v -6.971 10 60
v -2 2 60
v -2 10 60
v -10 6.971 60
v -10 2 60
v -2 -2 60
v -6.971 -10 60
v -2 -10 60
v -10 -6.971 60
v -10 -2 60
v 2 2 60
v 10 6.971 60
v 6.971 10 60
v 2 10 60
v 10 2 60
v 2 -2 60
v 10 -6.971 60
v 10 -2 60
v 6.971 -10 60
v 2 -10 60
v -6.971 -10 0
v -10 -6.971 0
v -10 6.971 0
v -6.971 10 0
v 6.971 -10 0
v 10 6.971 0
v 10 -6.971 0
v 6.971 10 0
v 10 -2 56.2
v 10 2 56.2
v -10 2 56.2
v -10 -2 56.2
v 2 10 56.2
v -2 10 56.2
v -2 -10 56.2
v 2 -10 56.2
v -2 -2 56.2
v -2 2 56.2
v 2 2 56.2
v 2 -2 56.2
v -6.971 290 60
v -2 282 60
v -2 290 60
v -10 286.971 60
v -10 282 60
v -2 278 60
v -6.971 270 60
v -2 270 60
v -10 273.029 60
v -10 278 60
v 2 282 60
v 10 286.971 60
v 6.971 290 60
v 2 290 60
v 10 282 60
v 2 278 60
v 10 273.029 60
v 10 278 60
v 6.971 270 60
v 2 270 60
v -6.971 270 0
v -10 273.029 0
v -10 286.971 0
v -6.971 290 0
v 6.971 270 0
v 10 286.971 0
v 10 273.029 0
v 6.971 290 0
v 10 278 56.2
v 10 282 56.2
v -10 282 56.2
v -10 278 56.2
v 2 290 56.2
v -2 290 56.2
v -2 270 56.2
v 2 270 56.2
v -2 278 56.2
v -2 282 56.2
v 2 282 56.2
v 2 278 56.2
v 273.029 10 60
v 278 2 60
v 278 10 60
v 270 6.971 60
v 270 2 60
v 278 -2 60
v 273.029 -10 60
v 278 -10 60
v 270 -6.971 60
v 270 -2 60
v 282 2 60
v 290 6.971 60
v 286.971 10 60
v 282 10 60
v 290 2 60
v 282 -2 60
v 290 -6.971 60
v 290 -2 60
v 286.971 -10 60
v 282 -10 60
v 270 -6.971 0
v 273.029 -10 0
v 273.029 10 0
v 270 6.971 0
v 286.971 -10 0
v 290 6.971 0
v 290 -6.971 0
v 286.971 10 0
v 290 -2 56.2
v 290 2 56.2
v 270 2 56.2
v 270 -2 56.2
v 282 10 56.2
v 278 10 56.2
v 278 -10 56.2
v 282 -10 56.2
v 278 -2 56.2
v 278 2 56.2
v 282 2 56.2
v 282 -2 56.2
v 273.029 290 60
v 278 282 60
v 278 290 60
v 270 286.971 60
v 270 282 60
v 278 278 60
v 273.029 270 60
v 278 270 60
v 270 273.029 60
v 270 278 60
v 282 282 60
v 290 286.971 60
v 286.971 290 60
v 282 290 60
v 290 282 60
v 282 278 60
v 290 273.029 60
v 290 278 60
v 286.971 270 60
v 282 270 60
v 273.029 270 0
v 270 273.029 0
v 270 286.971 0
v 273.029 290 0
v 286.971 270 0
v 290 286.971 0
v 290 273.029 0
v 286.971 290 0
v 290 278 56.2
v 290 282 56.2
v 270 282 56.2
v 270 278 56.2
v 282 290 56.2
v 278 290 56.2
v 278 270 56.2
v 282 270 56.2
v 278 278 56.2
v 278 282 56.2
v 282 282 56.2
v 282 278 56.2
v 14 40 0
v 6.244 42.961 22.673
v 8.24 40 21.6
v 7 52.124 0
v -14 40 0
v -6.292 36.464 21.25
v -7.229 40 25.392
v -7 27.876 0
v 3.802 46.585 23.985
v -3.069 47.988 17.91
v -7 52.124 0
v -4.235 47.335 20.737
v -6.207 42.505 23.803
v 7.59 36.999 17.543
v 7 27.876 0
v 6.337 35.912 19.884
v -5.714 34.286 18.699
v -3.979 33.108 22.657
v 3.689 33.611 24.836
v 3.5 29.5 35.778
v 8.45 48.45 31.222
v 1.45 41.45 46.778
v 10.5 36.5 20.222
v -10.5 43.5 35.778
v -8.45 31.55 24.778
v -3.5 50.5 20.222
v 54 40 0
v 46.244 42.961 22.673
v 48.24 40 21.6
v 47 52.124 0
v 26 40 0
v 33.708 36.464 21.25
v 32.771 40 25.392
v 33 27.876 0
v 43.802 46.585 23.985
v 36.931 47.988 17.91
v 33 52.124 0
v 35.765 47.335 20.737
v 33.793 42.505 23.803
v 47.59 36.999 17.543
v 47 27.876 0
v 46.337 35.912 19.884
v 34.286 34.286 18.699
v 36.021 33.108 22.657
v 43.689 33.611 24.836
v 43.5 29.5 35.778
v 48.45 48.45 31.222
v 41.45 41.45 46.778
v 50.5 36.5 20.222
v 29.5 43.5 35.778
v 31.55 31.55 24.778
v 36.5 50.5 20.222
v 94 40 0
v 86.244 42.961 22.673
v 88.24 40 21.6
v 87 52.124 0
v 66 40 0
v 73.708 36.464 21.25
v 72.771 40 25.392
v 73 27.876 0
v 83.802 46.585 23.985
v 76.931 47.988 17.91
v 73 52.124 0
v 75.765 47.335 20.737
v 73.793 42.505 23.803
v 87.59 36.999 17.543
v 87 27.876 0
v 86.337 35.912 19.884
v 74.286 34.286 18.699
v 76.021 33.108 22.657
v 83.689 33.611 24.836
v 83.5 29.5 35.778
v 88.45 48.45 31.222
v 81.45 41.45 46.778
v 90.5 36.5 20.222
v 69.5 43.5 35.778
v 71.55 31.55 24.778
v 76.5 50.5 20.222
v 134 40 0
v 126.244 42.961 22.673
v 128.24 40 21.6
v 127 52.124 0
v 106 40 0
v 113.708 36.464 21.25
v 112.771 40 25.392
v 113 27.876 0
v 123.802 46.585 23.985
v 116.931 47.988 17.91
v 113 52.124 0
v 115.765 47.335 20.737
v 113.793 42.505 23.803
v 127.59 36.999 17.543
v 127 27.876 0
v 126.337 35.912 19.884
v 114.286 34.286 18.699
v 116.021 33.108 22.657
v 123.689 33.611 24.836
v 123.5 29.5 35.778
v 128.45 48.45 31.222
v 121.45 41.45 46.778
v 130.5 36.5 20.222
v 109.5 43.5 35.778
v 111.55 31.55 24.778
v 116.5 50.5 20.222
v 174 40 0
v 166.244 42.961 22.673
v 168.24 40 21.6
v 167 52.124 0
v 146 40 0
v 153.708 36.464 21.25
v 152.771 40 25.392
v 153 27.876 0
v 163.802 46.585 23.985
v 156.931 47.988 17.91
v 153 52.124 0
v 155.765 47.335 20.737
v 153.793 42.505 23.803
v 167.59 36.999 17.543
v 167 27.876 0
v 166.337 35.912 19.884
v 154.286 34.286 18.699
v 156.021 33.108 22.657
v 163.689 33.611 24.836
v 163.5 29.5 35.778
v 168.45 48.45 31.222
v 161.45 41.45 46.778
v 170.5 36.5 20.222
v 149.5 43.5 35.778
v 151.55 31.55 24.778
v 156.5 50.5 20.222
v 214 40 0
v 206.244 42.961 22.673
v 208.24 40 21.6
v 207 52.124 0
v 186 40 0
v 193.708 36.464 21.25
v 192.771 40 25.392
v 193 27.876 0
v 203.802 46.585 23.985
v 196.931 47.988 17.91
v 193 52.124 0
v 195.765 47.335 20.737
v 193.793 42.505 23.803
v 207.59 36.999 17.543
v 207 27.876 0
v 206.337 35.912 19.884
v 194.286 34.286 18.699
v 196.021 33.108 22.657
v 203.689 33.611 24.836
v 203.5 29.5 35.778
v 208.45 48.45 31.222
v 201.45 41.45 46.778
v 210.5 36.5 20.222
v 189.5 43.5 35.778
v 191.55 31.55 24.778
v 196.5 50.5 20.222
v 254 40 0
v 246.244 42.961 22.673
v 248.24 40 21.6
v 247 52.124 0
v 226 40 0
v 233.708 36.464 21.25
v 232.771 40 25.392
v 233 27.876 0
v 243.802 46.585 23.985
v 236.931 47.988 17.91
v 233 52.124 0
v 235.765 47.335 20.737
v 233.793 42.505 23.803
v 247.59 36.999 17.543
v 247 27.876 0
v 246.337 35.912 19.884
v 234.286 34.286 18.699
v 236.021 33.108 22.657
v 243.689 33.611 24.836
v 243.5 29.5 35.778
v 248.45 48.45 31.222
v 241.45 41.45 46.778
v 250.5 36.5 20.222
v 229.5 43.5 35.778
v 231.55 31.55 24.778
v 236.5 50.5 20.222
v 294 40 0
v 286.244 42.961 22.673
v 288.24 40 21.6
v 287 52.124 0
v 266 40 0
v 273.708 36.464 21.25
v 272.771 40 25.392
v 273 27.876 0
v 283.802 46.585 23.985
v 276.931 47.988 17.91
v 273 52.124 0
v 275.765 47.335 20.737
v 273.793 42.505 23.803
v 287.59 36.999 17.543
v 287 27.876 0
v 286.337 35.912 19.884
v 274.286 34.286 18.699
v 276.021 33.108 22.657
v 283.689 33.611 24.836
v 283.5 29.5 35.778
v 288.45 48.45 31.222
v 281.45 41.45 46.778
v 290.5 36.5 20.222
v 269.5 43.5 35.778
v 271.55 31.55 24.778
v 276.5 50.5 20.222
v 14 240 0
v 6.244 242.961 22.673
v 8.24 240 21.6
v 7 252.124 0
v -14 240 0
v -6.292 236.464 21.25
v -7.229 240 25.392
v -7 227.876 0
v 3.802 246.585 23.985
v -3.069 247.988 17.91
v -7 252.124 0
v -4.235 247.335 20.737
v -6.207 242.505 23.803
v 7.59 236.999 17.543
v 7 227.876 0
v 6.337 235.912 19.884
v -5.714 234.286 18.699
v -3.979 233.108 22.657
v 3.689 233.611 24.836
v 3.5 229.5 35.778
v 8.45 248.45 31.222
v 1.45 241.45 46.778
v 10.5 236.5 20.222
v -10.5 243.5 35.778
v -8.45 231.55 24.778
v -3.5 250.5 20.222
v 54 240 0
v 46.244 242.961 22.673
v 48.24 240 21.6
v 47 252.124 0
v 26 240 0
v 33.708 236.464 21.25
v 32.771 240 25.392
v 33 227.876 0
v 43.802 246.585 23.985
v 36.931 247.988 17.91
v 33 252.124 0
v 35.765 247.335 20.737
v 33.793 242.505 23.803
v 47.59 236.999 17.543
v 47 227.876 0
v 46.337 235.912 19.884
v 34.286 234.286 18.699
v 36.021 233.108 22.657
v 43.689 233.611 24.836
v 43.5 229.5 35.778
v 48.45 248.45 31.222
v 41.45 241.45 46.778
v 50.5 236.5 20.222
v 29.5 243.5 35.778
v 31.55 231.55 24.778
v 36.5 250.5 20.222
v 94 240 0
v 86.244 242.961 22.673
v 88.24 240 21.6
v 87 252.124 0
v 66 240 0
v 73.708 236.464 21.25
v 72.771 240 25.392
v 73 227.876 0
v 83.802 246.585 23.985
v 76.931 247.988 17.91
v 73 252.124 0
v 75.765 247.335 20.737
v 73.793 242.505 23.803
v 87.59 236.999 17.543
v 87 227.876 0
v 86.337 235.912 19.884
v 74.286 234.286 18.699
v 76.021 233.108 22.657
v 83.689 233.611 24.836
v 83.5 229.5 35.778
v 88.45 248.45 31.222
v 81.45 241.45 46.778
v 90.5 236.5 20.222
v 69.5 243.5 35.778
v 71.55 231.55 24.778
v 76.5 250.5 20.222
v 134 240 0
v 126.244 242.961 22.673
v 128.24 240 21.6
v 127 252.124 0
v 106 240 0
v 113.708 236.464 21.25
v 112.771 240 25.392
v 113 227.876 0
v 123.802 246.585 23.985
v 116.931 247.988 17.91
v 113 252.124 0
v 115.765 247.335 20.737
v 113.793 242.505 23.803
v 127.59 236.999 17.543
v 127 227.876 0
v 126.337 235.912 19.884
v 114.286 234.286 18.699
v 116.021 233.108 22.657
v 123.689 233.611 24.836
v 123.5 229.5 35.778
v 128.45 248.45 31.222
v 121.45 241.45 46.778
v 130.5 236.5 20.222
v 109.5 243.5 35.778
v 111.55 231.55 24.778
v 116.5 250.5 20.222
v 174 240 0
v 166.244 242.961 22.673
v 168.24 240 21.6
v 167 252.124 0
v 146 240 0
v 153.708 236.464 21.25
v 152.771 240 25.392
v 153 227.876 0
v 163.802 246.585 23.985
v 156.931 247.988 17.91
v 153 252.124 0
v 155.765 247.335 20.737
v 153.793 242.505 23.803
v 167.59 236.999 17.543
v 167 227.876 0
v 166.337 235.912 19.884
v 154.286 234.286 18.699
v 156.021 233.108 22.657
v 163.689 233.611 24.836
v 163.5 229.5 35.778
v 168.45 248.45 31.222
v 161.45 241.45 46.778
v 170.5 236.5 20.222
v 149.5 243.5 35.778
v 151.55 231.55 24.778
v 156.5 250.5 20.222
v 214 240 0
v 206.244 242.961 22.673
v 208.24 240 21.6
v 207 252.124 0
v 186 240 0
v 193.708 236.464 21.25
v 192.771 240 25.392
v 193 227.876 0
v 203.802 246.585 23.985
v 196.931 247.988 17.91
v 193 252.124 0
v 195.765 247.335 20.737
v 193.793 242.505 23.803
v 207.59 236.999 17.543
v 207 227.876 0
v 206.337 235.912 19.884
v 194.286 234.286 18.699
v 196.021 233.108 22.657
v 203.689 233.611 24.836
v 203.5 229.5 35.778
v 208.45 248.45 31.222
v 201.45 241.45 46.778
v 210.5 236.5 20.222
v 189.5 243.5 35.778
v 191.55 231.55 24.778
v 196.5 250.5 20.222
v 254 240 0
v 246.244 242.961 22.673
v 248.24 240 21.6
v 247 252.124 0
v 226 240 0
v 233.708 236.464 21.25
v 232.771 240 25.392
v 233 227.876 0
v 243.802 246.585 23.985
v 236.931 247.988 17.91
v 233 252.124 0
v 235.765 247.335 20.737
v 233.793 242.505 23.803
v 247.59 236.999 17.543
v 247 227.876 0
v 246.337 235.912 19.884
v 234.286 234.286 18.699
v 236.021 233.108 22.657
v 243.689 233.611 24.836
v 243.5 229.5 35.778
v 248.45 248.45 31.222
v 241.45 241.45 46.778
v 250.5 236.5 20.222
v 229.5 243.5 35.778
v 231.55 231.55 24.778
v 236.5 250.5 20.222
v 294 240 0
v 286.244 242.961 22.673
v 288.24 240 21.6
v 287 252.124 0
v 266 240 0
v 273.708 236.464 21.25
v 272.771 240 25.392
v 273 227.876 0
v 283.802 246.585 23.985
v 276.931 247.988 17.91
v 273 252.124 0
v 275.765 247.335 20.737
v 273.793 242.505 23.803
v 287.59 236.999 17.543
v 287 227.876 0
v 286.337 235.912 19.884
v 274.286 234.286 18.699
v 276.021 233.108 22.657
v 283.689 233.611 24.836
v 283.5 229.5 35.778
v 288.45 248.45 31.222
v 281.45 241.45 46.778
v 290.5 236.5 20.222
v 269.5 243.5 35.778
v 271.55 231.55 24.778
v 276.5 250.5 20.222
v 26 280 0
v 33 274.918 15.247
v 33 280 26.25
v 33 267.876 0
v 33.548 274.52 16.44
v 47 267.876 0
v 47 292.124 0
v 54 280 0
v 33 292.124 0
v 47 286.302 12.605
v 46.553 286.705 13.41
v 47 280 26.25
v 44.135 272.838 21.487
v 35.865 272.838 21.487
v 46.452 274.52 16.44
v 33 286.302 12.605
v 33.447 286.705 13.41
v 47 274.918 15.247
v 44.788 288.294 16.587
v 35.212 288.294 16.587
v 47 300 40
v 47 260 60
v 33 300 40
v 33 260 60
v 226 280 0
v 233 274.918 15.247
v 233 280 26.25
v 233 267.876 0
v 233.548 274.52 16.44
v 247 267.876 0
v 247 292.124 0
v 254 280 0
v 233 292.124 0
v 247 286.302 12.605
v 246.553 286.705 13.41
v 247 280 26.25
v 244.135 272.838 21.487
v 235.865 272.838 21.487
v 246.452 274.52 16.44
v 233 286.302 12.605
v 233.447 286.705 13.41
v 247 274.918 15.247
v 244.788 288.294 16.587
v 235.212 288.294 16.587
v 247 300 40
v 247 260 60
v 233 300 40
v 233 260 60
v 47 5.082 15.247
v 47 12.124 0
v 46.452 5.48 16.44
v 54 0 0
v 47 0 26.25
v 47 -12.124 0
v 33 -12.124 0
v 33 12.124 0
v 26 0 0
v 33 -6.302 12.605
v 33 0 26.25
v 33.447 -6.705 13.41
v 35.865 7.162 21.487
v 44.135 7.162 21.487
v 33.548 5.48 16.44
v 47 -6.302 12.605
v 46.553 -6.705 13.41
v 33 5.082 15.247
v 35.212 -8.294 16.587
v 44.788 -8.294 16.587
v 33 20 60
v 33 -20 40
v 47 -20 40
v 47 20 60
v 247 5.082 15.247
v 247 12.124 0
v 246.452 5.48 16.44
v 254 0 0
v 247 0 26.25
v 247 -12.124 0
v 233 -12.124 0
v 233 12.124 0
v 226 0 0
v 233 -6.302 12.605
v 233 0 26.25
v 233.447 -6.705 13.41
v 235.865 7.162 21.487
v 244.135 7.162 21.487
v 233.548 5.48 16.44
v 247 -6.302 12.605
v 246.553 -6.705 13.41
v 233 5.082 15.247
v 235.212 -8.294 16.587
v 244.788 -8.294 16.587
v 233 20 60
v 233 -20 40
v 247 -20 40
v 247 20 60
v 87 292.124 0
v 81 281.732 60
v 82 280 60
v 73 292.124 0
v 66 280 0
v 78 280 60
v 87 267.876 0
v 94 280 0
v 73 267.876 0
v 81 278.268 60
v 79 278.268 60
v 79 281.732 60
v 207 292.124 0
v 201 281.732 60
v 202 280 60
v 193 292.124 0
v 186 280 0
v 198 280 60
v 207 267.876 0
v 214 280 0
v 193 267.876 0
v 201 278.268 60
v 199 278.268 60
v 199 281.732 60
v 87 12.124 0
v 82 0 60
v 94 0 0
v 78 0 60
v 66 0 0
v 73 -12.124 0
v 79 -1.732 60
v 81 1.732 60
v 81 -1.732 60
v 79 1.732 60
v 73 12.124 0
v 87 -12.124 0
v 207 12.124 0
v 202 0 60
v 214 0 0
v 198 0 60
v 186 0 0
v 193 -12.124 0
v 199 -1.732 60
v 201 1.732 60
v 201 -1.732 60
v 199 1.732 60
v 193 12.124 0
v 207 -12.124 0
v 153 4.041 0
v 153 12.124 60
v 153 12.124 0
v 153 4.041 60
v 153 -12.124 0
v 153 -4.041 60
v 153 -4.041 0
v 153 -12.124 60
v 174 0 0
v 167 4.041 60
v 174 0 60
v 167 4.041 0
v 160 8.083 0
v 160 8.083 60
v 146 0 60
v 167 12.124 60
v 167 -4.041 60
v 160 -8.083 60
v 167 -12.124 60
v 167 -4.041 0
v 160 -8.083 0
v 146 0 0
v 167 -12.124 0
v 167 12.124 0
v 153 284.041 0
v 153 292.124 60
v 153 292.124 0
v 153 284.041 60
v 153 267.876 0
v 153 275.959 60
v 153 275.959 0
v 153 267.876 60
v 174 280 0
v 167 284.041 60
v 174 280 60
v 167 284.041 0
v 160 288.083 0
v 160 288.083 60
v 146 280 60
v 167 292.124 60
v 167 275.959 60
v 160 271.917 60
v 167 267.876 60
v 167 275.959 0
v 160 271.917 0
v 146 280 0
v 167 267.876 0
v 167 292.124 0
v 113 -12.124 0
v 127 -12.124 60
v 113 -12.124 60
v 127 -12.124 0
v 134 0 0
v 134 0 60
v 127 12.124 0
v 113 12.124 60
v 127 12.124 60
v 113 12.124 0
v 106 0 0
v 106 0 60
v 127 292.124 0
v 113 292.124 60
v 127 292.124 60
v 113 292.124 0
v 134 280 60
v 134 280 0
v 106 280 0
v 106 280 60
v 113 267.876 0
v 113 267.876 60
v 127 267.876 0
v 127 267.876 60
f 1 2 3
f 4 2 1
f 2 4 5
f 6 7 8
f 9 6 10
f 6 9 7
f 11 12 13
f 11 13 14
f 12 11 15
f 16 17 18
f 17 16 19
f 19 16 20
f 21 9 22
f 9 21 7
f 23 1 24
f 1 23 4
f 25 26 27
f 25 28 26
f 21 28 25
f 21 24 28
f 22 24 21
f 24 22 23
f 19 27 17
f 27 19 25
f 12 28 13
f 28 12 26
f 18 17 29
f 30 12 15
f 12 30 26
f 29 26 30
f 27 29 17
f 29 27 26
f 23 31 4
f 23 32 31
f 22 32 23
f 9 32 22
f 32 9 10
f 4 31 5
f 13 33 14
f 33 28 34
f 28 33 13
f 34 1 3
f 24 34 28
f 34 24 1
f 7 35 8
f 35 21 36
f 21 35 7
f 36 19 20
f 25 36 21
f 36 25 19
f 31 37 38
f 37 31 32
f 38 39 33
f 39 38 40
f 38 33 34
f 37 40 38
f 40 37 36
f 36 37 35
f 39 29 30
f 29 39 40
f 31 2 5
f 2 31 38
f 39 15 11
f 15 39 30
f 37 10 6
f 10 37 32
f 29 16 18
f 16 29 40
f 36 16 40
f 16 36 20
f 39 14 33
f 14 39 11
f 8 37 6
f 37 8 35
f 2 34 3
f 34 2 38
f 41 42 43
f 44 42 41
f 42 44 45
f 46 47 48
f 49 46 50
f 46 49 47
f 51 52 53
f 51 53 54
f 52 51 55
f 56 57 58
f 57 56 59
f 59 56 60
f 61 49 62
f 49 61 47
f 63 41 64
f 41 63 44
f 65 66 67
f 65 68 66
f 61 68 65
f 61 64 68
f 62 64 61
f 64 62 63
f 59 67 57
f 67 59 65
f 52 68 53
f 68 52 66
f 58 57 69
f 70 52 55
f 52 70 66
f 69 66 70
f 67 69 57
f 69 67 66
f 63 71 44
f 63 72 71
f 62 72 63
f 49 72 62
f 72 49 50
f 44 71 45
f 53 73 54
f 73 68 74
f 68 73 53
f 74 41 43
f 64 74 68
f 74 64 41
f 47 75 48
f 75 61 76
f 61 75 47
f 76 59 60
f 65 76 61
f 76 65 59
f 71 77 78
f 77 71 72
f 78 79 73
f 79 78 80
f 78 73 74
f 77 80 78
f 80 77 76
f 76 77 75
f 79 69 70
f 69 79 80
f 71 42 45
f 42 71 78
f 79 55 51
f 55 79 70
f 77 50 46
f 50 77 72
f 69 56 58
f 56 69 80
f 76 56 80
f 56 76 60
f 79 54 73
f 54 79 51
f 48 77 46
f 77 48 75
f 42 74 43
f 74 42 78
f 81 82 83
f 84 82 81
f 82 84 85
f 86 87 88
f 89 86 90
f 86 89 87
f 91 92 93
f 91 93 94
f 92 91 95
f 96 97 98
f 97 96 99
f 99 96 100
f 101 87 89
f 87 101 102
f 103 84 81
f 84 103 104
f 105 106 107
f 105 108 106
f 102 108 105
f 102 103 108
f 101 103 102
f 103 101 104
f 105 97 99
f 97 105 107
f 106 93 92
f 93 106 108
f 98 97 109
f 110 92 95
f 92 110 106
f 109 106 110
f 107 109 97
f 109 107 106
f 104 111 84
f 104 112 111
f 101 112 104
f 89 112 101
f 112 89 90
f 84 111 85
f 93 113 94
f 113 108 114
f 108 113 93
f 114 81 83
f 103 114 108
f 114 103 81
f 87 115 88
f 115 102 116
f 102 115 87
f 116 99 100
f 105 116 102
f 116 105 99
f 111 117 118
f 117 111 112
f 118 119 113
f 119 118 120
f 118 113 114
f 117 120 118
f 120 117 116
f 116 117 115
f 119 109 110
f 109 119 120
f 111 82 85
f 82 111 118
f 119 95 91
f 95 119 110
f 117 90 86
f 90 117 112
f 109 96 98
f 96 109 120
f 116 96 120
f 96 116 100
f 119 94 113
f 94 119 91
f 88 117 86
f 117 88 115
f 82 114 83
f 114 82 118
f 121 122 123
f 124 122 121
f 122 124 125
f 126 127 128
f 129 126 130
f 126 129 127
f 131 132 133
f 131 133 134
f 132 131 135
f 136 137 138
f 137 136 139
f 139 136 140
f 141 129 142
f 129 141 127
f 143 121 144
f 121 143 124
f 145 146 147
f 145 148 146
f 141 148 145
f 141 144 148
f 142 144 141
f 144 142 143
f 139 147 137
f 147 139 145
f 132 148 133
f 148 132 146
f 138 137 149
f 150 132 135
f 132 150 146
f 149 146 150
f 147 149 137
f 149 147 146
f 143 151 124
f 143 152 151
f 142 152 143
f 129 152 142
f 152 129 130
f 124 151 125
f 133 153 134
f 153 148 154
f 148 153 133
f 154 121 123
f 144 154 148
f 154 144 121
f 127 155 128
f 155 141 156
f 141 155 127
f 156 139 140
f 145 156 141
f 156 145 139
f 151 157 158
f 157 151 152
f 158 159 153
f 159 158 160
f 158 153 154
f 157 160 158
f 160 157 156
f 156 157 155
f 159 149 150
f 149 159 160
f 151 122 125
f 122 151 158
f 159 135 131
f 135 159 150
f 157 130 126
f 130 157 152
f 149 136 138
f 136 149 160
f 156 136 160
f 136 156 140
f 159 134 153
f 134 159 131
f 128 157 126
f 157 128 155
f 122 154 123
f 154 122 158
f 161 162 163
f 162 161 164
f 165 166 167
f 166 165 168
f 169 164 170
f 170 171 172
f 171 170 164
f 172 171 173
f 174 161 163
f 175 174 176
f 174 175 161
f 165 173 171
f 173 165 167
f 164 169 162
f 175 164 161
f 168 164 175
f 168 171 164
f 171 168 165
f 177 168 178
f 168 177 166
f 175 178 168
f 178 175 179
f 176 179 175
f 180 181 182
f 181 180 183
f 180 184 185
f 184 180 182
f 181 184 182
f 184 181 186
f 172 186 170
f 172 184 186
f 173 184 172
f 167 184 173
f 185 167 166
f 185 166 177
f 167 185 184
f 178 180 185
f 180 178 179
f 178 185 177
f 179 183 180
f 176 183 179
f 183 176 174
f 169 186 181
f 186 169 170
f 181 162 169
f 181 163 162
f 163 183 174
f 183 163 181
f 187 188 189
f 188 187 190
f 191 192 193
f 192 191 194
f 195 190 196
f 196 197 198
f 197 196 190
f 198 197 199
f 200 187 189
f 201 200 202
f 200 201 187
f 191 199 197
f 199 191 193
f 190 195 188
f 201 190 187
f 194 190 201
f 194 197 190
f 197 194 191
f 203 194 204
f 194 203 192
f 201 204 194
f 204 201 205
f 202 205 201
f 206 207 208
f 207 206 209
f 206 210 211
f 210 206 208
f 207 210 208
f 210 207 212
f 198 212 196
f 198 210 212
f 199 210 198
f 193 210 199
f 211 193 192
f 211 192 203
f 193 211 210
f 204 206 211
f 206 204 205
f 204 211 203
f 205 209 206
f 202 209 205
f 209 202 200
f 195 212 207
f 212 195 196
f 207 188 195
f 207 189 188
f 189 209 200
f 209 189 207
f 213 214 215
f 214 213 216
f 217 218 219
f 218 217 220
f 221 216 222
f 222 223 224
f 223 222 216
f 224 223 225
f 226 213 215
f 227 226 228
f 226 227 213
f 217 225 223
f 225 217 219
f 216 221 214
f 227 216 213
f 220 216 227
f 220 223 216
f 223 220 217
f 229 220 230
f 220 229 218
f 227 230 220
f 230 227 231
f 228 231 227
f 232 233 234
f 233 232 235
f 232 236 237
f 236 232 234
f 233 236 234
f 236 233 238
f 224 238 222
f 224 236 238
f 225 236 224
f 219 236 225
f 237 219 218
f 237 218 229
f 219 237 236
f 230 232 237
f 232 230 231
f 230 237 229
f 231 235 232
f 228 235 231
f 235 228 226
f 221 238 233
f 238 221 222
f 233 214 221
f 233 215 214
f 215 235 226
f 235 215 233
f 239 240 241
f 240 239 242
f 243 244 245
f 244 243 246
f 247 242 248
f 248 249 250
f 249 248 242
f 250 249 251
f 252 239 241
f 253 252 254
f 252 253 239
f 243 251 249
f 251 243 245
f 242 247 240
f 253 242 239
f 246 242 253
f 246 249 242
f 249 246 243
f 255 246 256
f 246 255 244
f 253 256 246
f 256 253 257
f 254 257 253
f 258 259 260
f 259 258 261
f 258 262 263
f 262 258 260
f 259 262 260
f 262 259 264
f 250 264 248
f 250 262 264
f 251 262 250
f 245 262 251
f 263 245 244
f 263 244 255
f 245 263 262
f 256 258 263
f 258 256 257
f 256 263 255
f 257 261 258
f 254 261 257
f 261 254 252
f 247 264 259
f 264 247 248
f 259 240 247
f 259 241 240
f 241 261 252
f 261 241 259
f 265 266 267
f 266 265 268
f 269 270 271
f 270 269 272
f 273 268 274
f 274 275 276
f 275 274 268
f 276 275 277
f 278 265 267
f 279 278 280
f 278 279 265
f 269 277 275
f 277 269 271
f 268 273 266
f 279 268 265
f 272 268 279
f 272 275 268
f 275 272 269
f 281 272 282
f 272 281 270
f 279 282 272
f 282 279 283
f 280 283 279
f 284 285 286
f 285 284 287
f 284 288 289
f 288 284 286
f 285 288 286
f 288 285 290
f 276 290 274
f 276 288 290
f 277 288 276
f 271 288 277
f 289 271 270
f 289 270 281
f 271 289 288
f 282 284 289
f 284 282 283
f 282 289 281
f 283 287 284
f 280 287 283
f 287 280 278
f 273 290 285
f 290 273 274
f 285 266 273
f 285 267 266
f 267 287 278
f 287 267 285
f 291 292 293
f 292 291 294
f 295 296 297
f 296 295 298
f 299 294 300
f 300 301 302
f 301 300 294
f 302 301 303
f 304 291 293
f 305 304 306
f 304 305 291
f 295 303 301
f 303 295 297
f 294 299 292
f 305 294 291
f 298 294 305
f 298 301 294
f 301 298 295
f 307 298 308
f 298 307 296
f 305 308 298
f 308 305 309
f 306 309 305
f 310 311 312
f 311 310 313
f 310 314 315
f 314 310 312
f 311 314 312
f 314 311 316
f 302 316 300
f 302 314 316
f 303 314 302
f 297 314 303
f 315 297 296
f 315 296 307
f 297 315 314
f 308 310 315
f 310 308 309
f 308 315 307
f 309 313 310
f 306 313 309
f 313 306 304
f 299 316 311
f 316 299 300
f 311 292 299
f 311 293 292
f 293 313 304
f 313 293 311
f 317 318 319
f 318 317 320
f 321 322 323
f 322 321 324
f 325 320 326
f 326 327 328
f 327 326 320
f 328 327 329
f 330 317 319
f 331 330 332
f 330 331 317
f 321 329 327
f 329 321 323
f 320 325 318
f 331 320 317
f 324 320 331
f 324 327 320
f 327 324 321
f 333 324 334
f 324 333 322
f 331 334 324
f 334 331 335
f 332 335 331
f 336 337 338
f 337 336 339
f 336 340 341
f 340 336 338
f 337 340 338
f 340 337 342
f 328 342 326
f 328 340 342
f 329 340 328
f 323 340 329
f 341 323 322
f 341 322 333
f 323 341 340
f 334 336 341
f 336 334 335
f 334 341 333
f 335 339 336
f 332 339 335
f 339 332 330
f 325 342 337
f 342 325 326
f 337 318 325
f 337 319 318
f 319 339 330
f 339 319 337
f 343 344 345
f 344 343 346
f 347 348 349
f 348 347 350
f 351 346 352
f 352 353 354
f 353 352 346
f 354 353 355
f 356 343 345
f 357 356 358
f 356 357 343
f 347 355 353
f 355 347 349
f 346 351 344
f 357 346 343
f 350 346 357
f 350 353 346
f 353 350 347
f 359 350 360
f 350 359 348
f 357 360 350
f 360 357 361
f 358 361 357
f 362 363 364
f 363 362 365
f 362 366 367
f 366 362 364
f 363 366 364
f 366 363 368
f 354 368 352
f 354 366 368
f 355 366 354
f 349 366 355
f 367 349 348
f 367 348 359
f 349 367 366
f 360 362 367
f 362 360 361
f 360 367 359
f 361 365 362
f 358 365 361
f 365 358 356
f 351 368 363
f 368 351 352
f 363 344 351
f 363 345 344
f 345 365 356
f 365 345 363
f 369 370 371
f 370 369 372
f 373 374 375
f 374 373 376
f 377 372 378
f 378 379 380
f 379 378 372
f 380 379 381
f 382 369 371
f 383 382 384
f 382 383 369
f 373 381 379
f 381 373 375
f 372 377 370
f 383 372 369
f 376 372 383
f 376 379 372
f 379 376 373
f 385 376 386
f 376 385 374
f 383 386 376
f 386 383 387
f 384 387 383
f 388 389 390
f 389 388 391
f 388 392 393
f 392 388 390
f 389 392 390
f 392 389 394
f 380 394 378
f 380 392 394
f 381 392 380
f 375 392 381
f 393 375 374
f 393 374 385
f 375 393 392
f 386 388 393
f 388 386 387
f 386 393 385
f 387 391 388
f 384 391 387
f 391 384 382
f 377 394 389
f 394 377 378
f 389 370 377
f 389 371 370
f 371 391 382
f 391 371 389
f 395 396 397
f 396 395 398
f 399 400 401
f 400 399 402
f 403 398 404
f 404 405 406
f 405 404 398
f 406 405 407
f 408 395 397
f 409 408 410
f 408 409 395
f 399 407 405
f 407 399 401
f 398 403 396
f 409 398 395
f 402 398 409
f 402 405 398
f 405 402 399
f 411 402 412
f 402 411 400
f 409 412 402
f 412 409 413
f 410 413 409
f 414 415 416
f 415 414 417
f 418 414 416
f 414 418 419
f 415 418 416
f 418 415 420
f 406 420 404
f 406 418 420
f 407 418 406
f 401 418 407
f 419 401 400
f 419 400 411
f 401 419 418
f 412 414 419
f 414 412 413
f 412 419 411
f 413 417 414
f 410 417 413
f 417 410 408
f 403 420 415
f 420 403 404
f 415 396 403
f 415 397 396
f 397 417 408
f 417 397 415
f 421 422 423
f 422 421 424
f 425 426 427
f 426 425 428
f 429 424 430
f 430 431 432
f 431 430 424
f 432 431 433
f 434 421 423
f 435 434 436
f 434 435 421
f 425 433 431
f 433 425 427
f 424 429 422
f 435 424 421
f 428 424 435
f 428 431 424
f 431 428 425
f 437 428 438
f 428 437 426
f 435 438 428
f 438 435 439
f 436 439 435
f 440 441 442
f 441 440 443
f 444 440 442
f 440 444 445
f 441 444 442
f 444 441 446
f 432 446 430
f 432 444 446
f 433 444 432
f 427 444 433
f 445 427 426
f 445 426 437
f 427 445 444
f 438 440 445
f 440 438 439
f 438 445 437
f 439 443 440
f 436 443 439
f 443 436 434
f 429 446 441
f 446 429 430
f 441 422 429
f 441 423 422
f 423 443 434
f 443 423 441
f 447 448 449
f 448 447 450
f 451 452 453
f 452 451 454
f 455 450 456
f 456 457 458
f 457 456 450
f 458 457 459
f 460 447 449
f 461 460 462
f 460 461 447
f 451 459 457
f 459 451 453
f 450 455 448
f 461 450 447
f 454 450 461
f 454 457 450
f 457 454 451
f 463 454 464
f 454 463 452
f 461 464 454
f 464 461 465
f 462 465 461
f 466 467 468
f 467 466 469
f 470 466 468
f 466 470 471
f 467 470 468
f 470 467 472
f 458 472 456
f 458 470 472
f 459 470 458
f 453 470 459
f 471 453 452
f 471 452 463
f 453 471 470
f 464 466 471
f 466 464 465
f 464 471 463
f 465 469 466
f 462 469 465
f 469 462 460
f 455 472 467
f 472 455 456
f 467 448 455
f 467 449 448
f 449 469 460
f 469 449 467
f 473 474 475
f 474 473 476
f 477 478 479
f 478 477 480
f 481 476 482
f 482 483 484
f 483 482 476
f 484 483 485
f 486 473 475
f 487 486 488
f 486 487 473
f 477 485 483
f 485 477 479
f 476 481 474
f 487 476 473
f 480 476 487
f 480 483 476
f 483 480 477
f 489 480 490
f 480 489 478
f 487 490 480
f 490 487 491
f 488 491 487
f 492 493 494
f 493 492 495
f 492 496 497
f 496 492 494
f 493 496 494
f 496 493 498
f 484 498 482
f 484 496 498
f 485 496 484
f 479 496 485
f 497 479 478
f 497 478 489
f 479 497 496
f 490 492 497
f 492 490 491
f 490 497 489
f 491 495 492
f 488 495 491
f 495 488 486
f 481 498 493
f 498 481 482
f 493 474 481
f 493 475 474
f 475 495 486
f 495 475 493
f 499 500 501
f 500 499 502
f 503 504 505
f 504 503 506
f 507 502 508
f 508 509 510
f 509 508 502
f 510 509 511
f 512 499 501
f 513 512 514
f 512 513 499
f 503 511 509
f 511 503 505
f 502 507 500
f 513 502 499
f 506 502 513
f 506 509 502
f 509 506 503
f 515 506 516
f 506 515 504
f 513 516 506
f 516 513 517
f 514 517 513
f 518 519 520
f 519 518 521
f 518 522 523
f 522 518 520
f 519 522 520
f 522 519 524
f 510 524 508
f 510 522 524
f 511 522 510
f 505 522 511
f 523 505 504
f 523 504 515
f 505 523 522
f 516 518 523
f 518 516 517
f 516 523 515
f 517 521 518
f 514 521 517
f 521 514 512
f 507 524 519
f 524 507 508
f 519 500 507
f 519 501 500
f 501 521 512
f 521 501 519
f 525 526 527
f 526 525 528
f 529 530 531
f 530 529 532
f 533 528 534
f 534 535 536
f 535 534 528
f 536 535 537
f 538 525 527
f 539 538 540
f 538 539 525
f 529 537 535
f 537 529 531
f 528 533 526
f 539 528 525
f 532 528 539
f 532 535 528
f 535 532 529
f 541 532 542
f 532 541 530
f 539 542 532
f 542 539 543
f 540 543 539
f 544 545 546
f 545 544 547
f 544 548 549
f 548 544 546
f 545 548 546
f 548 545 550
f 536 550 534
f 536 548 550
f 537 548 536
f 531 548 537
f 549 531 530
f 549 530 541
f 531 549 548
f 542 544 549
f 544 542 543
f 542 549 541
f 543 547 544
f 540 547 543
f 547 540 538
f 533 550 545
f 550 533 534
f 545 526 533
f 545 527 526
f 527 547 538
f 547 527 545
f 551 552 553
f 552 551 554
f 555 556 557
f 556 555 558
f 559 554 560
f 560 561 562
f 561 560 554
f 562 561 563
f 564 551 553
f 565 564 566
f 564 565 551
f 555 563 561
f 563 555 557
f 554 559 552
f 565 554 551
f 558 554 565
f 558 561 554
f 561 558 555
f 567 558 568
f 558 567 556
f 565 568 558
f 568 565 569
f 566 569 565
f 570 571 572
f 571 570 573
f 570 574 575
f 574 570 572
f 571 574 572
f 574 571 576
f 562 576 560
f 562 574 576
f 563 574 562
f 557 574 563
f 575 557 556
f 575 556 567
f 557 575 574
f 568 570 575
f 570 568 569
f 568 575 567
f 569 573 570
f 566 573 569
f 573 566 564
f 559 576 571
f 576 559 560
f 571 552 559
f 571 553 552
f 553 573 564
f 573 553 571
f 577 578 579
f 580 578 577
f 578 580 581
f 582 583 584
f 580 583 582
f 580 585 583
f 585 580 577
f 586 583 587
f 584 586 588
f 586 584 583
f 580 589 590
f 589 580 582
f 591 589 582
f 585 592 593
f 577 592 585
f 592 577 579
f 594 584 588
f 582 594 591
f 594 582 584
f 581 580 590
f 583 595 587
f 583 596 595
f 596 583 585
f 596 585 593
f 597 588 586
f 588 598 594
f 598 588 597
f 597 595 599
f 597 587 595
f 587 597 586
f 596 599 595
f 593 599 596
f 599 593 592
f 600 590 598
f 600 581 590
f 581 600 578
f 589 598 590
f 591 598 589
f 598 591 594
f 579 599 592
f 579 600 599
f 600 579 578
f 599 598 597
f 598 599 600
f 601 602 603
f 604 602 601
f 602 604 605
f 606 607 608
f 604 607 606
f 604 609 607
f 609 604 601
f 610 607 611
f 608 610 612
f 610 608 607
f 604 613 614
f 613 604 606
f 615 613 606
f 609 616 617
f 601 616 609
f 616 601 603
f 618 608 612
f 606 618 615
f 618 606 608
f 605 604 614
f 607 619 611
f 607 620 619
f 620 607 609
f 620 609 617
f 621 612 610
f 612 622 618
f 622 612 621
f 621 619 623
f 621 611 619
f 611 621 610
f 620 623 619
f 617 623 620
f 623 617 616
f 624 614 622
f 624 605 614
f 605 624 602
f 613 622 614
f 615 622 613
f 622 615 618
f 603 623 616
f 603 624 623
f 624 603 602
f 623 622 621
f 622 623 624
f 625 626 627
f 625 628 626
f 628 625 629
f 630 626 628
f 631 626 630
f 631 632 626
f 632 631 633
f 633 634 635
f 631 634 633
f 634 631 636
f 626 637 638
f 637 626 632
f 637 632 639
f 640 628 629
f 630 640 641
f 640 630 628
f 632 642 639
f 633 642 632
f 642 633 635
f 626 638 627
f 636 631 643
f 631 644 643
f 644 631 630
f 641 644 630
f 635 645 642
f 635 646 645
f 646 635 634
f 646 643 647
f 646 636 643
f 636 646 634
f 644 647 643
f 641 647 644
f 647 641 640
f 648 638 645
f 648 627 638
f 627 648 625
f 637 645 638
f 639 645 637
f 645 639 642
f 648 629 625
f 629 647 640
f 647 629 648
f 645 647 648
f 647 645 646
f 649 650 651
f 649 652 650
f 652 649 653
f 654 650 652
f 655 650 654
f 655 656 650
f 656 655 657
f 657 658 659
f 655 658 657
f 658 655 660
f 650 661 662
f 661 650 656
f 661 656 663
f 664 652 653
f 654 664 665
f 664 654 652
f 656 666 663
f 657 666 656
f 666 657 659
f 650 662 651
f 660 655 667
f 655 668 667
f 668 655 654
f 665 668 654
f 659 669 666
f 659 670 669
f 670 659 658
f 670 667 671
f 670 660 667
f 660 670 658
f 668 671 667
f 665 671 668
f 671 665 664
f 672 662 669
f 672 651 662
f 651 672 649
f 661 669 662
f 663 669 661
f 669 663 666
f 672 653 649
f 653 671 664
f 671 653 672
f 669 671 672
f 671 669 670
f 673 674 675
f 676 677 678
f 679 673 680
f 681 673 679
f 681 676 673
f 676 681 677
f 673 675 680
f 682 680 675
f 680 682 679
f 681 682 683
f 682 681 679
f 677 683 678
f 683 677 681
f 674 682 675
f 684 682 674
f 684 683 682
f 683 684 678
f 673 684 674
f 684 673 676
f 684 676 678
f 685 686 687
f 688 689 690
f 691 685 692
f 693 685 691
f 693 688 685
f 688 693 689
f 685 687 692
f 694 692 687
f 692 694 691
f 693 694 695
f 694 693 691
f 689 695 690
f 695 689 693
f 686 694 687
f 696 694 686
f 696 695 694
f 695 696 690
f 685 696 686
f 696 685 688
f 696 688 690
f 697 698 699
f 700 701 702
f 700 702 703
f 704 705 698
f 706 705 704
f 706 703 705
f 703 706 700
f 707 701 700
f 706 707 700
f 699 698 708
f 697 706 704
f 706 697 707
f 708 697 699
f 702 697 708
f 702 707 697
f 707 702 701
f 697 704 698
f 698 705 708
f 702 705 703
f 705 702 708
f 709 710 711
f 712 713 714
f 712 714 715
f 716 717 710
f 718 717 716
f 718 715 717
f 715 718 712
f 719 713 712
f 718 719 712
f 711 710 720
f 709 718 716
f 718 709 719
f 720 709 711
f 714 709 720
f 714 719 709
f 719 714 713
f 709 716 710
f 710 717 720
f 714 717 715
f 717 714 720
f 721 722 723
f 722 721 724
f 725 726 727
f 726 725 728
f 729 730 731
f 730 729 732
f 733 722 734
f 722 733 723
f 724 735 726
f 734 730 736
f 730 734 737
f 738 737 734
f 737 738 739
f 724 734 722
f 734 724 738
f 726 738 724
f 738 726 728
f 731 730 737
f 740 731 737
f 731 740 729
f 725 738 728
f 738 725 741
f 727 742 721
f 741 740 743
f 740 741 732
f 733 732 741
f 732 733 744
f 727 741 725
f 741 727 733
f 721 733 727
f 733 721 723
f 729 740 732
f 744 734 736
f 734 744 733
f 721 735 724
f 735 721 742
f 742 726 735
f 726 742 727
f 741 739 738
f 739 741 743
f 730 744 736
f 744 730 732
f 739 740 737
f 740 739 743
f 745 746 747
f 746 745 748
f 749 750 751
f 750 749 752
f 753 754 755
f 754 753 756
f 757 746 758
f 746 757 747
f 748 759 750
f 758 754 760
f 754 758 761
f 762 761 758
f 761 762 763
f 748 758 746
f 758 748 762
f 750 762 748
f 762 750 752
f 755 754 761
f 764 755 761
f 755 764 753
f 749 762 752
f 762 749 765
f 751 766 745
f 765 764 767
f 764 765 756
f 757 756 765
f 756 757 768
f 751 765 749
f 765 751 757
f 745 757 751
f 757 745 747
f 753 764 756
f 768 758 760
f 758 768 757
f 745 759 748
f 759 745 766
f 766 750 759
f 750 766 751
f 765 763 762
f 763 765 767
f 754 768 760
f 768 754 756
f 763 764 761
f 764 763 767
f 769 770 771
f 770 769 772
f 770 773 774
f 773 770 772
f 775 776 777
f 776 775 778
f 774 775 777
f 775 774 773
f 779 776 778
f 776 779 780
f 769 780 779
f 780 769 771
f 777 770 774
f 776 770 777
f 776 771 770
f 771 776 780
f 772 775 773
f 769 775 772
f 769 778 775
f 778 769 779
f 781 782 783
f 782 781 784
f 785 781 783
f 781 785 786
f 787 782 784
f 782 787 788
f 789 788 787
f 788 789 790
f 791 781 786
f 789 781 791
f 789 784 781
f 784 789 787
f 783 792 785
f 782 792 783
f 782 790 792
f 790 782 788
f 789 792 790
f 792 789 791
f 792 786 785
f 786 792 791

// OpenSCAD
$fn = 6;

// Parametric design, allows to control what is printed exactly
printHalfPieces=false;
printAllPieces=true;
printFive=false;
printBoard=true;

module rook(height) {
    ht=height/60;
    // Base
    difference(){
    intersection(){
    translate([0,0,30*ht]){
        rotate([0,0,45]){
    cube([24*ht,24*ht,60*ht], center=true);
    }    
}
    
    translate([0,0,30*ht]){
    cube([20*ht,20*ht,60*ht], center=true);
    }
}
        // Crenels
        union(){
            translate([0,0,58.2*ht]){
                cube([30*ht,4*ht,4*ht],center=true);
            }
            translate([0,0,58.2*ht]){
                cube([4*ht,30*ht,4*ht],center=true);
            }
        }
    }
}
    


module pawn(height) {
    ht = height/60;
    union(){
        cylinder(h=30*ht,r2=6*ht, r1=14*ht);
        translate([0,0,28*ht]){
        scale([1.4,1.4,2.2]){
        rotate([45,45,45]){
            
        cube(10,10,10, center=true);
        }
    }
    }
    }
}

module knight(height){
    ht=height/60;
    union(){
        // Base
        cylinder(h=30*ht,r2=6*ht, r1=14*ht);
        
        // Horse
        polyhedron(
            points = [[7*ht,0,0],[-7*ht,0,0],
                      [-7*ht,-20*ht,40*ht],[7*ht,-20*ht,40*ht],
                      [7*ht,20*ht,60*ht],[-7*ht,20*ht,60*ht]],
    
            faces = [[0,1,2,3],[5,2,1],[5,4,3,2],[0,3,4],[0,4,5,1]]
        );
    }
}

module bishop(height){
    $fn=6;
    ht=height/60;
    cylinder(h=60*ht,r2=2*ht, r1=14*ht);
}

module king(height){
   $fn=3;
   union(){
   ht=height/60;
        // Base 
            cylinder(h=60*ht,r=14*ht);
            rotate([0,0,60]) cylinder(h=60*ht,r=14*ht);
   }
}
module queen(height){
    ht=height/60;
    $fn=6;
        cylinder(h=60*ht,r=14*ht);
}


if (printHalfPieces==true){
// Rooks
for (i = [0:7:7]){
        translate([i*40,j*40,0]){
            rook(60);
        }
}

// Pawns
for (j = [0:1:7]){
    translate([j*40,40,0]){
    pawn(60);
    }
}

// Knights

for (i= [1:5:6]){
    translate([i*40,0,0]){
        knight(60); 
    }
}

for (i= [2:3:5]){
    translate([i*40,0,0]){
        rotate([0,0,0]){
            bishop(60); 
        }
    }
}

// Queens
translate([120,0,0]){
    queen(60);
}

// Kings
translate([160,0,0]){
    king(60);
}

}

if (printAllPieces==true) {
// Rooks
for (i = [0:7:7]){
    for (j = [0:7:7]){
        translate([i*40,j*40,0]){
            rook(60);
        }
    }
}

// Pawns
for (i = [1:5:6]){
    for (j = [0:1:7]){
        translate([j*40,i*40,0]){
        pawn(60);
        }
    }
}

// Knights
for (i= [1:5:6]){
        translate([i*40,280,0]){
            rotate([0,0,180]){
        knight(60); 
        }
    }
}

for (i= [1:5:6]){
        translate([i*40,0,0]){
            knight(60); 
        }
    }

// Bishops
for (i= [2:3:5]){
        translate([i*40,280,0]){
            rotate([0,0,180]){
                bishop(60); 
            }
        }
    }

for (i= [2:3:5]){
        translate([i*40,0,0]){
            rotate([0,0,0]){
                bishop(60); 
            }
        }
    }

// Queens
translate([120,0,0]){
    queen(60);
}

translate([120,280,0]){
    queen(60);
}

// Kings
translate([160,0,0]){
    king(60);
}

translate([160,280,0]){
    king(60);
}
}

if (printBoard==true){

// Board
for (i = [0:1:7]){
    for (j = [0:1:7]){
        if ((i+j) % 2 == 0) {
            translate([j*40,i*40,0]){
            square(40, center=true);
            }
        }
    }
}
}


if (printFive==true){
    pawn(60);
    translate([40,0,0]) rook(60);
    translate([0,40,0]) knight(60);
    translate([0,-40,0]) bishop(60);
    translate([-40,0,0]) queen(60);
    translate([40,40,0]) king(60);
}
    
